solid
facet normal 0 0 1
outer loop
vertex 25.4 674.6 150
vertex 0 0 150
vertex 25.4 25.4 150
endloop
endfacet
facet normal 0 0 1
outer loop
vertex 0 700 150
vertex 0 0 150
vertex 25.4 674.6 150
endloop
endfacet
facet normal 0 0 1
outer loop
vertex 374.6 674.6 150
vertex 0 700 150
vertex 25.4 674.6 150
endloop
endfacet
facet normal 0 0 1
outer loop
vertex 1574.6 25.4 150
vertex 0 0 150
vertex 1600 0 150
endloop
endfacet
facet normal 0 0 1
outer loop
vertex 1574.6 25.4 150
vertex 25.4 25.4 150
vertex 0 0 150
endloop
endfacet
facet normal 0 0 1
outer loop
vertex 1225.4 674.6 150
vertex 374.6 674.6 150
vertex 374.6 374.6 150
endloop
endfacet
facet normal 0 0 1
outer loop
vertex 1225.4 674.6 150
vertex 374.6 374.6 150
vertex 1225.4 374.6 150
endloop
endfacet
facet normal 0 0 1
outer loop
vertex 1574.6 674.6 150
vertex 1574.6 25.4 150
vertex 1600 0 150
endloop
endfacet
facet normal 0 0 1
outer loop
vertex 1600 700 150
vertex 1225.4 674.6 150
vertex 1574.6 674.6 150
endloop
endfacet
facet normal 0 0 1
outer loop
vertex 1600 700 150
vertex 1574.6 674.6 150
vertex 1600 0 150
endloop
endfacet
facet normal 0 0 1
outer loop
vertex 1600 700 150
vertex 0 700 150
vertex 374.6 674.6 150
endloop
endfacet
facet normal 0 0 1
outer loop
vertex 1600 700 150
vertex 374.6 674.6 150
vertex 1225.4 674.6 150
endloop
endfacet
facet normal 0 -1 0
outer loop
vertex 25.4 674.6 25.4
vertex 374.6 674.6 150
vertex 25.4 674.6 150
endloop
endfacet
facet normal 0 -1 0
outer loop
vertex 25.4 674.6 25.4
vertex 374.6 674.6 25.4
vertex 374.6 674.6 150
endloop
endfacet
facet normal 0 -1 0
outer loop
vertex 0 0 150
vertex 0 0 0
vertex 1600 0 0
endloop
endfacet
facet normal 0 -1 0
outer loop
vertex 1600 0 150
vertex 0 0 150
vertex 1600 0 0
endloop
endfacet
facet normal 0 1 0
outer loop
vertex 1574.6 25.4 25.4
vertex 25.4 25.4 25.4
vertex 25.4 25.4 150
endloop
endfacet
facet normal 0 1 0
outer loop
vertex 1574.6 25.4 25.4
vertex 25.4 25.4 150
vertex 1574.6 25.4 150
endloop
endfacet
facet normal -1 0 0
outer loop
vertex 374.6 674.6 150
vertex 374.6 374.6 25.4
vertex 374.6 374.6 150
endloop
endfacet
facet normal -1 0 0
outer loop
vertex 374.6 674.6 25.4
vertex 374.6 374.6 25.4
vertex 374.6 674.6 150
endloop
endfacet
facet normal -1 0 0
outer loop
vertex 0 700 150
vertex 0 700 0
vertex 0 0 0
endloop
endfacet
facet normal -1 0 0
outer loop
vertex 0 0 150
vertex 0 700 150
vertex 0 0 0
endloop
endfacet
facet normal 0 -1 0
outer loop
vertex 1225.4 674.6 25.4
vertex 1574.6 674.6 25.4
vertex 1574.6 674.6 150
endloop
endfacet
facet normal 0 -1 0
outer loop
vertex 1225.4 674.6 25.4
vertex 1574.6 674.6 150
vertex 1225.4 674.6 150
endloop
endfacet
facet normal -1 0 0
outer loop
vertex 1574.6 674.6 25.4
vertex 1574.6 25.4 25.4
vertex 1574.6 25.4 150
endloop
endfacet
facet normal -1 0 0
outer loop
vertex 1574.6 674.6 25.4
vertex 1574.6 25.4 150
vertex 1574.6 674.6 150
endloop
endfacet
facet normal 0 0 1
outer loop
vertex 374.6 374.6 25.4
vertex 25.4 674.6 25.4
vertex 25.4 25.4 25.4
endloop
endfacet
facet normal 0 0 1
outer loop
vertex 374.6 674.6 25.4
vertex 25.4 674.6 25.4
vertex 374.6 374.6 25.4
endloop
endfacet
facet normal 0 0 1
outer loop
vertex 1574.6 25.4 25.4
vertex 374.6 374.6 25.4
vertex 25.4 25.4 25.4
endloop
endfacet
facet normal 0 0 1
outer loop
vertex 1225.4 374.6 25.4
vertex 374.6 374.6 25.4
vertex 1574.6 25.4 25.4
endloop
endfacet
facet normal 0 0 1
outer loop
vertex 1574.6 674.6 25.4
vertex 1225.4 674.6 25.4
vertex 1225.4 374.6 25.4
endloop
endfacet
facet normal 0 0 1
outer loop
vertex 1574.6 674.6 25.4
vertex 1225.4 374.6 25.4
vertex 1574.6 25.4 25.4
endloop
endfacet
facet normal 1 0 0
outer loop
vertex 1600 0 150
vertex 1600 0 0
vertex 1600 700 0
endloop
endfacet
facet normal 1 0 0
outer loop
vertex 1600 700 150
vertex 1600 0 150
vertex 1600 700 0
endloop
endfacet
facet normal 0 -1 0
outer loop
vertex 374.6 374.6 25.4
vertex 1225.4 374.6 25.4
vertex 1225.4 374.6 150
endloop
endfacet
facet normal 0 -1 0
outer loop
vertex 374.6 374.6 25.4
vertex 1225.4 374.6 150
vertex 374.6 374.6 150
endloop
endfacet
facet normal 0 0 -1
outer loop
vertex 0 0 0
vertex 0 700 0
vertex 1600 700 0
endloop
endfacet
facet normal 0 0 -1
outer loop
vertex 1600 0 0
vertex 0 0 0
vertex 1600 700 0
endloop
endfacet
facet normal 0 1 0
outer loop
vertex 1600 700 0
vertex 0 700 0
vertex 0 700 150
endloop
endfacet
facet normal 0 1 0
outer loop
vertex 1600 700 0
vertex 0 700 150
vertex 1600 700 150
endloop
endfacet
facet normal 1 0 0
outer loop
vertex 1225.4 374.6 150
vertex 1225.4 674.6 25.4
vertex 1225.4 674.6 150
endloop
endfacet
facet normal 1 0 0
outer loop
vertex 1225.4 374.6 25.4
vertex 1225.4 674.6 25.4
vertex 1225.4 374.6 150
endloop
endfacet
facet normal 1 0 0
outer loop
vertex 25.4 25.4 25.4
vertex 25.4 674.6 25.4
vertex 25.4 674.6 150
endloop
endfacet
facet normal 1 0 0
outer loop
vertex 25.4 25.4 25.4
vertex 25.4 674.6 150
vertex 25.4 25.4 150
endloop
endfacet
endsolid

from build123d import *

# Parameters (mm, degrees)
F1_DEPTH = 150
F3_T     = -25.4
F2_W     = 800
F2_H     = 300
F4_DEPTH = 150


with BuildPart() as f1:
    # F0 (on Top) → F1 (new body)
    with BuildSketch(Plane.XY):
        Polygon((0, 700), (0, 0), (1600, 0), (1600, 700), (1200, 700), (1200, 400), (400, 400), (400, 700), align=None)
    extrude(amount=F1_DEPTH)

    # F3
    f3_openings = [f1.faces().sort_by_distance(p)[0] for p in [
        (800, 295.454545, 150),
    ]]
    offset(amount=F3_T, openings=f3_openings, kind=Kind.INTERSECTION)

    # F2 (on Top) → F4 (join)
    with BuildSketch(Plane.XY):
        with Locations((800, 550)):
            Rectangle(F2_W, F2_H)
    extrude(amount=F4_DEPTH)


solid = f1.part
